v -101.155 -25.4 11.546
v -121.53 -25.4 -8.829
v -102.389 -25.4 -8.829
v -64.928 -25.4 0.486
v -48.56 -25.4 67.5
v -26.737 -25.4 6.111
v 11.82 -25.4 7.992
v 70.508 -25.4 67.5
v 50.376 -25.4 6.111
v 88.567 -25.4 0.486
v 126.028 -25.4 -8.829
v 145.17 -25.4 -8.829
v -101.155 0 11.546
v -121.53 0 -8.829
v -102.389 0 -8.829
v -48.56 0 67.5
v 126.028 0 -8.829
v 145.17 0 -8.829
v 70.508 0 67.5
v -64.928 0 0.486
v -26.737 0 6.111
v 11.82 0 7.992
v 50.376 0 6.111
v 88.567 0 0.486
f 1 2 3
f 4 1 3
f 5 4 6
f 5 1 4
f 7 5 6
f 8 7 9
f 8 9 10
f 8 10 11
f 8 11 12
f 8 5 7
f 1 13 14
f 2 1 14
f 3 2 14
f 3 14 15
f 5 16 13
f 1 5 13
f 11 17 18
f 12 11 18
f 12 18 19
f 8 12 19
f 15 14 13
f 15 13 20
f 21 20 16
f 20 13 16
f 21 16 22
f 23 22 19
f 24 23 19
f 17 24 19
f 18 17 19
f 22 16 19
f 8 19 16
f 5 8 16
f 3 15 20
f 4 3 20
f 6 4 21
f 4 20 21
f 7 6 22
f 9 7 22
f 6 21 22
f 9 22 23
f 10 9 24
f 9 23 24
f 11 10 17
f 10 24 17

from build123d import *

# Parameters (mm, degrees)
F1_DEPTH = 25.4


with BuildPart() as f1:
    # F0 (on Front) → F1 (new body)
    with BuildSketch(Plane.XZ):
        with BuildLine():
            Line((-101.154926, 11.54634), (-121.53038, -8.829114))
            Line((-121.53038, -8.829114), (-102.389246, -8.829114))
            ThreePointArc((-102.389246, -8.829114), (11.819616, 7.991988), (126.028478, -8.829114))
            Line((126.028478, -8.829114), (145.16962, -8.829114))
            Line((145.16962, -8.829114), (70.50777, 67.500003))
            Line((70.50777, 67.500003), (-48.560128, 67.500003))
            Line((-48.560128, 67.500003), (-101.154926, 11.54634))
        make_face()
    extrude(amount=F1_DEPTH)


solid = f1.part
